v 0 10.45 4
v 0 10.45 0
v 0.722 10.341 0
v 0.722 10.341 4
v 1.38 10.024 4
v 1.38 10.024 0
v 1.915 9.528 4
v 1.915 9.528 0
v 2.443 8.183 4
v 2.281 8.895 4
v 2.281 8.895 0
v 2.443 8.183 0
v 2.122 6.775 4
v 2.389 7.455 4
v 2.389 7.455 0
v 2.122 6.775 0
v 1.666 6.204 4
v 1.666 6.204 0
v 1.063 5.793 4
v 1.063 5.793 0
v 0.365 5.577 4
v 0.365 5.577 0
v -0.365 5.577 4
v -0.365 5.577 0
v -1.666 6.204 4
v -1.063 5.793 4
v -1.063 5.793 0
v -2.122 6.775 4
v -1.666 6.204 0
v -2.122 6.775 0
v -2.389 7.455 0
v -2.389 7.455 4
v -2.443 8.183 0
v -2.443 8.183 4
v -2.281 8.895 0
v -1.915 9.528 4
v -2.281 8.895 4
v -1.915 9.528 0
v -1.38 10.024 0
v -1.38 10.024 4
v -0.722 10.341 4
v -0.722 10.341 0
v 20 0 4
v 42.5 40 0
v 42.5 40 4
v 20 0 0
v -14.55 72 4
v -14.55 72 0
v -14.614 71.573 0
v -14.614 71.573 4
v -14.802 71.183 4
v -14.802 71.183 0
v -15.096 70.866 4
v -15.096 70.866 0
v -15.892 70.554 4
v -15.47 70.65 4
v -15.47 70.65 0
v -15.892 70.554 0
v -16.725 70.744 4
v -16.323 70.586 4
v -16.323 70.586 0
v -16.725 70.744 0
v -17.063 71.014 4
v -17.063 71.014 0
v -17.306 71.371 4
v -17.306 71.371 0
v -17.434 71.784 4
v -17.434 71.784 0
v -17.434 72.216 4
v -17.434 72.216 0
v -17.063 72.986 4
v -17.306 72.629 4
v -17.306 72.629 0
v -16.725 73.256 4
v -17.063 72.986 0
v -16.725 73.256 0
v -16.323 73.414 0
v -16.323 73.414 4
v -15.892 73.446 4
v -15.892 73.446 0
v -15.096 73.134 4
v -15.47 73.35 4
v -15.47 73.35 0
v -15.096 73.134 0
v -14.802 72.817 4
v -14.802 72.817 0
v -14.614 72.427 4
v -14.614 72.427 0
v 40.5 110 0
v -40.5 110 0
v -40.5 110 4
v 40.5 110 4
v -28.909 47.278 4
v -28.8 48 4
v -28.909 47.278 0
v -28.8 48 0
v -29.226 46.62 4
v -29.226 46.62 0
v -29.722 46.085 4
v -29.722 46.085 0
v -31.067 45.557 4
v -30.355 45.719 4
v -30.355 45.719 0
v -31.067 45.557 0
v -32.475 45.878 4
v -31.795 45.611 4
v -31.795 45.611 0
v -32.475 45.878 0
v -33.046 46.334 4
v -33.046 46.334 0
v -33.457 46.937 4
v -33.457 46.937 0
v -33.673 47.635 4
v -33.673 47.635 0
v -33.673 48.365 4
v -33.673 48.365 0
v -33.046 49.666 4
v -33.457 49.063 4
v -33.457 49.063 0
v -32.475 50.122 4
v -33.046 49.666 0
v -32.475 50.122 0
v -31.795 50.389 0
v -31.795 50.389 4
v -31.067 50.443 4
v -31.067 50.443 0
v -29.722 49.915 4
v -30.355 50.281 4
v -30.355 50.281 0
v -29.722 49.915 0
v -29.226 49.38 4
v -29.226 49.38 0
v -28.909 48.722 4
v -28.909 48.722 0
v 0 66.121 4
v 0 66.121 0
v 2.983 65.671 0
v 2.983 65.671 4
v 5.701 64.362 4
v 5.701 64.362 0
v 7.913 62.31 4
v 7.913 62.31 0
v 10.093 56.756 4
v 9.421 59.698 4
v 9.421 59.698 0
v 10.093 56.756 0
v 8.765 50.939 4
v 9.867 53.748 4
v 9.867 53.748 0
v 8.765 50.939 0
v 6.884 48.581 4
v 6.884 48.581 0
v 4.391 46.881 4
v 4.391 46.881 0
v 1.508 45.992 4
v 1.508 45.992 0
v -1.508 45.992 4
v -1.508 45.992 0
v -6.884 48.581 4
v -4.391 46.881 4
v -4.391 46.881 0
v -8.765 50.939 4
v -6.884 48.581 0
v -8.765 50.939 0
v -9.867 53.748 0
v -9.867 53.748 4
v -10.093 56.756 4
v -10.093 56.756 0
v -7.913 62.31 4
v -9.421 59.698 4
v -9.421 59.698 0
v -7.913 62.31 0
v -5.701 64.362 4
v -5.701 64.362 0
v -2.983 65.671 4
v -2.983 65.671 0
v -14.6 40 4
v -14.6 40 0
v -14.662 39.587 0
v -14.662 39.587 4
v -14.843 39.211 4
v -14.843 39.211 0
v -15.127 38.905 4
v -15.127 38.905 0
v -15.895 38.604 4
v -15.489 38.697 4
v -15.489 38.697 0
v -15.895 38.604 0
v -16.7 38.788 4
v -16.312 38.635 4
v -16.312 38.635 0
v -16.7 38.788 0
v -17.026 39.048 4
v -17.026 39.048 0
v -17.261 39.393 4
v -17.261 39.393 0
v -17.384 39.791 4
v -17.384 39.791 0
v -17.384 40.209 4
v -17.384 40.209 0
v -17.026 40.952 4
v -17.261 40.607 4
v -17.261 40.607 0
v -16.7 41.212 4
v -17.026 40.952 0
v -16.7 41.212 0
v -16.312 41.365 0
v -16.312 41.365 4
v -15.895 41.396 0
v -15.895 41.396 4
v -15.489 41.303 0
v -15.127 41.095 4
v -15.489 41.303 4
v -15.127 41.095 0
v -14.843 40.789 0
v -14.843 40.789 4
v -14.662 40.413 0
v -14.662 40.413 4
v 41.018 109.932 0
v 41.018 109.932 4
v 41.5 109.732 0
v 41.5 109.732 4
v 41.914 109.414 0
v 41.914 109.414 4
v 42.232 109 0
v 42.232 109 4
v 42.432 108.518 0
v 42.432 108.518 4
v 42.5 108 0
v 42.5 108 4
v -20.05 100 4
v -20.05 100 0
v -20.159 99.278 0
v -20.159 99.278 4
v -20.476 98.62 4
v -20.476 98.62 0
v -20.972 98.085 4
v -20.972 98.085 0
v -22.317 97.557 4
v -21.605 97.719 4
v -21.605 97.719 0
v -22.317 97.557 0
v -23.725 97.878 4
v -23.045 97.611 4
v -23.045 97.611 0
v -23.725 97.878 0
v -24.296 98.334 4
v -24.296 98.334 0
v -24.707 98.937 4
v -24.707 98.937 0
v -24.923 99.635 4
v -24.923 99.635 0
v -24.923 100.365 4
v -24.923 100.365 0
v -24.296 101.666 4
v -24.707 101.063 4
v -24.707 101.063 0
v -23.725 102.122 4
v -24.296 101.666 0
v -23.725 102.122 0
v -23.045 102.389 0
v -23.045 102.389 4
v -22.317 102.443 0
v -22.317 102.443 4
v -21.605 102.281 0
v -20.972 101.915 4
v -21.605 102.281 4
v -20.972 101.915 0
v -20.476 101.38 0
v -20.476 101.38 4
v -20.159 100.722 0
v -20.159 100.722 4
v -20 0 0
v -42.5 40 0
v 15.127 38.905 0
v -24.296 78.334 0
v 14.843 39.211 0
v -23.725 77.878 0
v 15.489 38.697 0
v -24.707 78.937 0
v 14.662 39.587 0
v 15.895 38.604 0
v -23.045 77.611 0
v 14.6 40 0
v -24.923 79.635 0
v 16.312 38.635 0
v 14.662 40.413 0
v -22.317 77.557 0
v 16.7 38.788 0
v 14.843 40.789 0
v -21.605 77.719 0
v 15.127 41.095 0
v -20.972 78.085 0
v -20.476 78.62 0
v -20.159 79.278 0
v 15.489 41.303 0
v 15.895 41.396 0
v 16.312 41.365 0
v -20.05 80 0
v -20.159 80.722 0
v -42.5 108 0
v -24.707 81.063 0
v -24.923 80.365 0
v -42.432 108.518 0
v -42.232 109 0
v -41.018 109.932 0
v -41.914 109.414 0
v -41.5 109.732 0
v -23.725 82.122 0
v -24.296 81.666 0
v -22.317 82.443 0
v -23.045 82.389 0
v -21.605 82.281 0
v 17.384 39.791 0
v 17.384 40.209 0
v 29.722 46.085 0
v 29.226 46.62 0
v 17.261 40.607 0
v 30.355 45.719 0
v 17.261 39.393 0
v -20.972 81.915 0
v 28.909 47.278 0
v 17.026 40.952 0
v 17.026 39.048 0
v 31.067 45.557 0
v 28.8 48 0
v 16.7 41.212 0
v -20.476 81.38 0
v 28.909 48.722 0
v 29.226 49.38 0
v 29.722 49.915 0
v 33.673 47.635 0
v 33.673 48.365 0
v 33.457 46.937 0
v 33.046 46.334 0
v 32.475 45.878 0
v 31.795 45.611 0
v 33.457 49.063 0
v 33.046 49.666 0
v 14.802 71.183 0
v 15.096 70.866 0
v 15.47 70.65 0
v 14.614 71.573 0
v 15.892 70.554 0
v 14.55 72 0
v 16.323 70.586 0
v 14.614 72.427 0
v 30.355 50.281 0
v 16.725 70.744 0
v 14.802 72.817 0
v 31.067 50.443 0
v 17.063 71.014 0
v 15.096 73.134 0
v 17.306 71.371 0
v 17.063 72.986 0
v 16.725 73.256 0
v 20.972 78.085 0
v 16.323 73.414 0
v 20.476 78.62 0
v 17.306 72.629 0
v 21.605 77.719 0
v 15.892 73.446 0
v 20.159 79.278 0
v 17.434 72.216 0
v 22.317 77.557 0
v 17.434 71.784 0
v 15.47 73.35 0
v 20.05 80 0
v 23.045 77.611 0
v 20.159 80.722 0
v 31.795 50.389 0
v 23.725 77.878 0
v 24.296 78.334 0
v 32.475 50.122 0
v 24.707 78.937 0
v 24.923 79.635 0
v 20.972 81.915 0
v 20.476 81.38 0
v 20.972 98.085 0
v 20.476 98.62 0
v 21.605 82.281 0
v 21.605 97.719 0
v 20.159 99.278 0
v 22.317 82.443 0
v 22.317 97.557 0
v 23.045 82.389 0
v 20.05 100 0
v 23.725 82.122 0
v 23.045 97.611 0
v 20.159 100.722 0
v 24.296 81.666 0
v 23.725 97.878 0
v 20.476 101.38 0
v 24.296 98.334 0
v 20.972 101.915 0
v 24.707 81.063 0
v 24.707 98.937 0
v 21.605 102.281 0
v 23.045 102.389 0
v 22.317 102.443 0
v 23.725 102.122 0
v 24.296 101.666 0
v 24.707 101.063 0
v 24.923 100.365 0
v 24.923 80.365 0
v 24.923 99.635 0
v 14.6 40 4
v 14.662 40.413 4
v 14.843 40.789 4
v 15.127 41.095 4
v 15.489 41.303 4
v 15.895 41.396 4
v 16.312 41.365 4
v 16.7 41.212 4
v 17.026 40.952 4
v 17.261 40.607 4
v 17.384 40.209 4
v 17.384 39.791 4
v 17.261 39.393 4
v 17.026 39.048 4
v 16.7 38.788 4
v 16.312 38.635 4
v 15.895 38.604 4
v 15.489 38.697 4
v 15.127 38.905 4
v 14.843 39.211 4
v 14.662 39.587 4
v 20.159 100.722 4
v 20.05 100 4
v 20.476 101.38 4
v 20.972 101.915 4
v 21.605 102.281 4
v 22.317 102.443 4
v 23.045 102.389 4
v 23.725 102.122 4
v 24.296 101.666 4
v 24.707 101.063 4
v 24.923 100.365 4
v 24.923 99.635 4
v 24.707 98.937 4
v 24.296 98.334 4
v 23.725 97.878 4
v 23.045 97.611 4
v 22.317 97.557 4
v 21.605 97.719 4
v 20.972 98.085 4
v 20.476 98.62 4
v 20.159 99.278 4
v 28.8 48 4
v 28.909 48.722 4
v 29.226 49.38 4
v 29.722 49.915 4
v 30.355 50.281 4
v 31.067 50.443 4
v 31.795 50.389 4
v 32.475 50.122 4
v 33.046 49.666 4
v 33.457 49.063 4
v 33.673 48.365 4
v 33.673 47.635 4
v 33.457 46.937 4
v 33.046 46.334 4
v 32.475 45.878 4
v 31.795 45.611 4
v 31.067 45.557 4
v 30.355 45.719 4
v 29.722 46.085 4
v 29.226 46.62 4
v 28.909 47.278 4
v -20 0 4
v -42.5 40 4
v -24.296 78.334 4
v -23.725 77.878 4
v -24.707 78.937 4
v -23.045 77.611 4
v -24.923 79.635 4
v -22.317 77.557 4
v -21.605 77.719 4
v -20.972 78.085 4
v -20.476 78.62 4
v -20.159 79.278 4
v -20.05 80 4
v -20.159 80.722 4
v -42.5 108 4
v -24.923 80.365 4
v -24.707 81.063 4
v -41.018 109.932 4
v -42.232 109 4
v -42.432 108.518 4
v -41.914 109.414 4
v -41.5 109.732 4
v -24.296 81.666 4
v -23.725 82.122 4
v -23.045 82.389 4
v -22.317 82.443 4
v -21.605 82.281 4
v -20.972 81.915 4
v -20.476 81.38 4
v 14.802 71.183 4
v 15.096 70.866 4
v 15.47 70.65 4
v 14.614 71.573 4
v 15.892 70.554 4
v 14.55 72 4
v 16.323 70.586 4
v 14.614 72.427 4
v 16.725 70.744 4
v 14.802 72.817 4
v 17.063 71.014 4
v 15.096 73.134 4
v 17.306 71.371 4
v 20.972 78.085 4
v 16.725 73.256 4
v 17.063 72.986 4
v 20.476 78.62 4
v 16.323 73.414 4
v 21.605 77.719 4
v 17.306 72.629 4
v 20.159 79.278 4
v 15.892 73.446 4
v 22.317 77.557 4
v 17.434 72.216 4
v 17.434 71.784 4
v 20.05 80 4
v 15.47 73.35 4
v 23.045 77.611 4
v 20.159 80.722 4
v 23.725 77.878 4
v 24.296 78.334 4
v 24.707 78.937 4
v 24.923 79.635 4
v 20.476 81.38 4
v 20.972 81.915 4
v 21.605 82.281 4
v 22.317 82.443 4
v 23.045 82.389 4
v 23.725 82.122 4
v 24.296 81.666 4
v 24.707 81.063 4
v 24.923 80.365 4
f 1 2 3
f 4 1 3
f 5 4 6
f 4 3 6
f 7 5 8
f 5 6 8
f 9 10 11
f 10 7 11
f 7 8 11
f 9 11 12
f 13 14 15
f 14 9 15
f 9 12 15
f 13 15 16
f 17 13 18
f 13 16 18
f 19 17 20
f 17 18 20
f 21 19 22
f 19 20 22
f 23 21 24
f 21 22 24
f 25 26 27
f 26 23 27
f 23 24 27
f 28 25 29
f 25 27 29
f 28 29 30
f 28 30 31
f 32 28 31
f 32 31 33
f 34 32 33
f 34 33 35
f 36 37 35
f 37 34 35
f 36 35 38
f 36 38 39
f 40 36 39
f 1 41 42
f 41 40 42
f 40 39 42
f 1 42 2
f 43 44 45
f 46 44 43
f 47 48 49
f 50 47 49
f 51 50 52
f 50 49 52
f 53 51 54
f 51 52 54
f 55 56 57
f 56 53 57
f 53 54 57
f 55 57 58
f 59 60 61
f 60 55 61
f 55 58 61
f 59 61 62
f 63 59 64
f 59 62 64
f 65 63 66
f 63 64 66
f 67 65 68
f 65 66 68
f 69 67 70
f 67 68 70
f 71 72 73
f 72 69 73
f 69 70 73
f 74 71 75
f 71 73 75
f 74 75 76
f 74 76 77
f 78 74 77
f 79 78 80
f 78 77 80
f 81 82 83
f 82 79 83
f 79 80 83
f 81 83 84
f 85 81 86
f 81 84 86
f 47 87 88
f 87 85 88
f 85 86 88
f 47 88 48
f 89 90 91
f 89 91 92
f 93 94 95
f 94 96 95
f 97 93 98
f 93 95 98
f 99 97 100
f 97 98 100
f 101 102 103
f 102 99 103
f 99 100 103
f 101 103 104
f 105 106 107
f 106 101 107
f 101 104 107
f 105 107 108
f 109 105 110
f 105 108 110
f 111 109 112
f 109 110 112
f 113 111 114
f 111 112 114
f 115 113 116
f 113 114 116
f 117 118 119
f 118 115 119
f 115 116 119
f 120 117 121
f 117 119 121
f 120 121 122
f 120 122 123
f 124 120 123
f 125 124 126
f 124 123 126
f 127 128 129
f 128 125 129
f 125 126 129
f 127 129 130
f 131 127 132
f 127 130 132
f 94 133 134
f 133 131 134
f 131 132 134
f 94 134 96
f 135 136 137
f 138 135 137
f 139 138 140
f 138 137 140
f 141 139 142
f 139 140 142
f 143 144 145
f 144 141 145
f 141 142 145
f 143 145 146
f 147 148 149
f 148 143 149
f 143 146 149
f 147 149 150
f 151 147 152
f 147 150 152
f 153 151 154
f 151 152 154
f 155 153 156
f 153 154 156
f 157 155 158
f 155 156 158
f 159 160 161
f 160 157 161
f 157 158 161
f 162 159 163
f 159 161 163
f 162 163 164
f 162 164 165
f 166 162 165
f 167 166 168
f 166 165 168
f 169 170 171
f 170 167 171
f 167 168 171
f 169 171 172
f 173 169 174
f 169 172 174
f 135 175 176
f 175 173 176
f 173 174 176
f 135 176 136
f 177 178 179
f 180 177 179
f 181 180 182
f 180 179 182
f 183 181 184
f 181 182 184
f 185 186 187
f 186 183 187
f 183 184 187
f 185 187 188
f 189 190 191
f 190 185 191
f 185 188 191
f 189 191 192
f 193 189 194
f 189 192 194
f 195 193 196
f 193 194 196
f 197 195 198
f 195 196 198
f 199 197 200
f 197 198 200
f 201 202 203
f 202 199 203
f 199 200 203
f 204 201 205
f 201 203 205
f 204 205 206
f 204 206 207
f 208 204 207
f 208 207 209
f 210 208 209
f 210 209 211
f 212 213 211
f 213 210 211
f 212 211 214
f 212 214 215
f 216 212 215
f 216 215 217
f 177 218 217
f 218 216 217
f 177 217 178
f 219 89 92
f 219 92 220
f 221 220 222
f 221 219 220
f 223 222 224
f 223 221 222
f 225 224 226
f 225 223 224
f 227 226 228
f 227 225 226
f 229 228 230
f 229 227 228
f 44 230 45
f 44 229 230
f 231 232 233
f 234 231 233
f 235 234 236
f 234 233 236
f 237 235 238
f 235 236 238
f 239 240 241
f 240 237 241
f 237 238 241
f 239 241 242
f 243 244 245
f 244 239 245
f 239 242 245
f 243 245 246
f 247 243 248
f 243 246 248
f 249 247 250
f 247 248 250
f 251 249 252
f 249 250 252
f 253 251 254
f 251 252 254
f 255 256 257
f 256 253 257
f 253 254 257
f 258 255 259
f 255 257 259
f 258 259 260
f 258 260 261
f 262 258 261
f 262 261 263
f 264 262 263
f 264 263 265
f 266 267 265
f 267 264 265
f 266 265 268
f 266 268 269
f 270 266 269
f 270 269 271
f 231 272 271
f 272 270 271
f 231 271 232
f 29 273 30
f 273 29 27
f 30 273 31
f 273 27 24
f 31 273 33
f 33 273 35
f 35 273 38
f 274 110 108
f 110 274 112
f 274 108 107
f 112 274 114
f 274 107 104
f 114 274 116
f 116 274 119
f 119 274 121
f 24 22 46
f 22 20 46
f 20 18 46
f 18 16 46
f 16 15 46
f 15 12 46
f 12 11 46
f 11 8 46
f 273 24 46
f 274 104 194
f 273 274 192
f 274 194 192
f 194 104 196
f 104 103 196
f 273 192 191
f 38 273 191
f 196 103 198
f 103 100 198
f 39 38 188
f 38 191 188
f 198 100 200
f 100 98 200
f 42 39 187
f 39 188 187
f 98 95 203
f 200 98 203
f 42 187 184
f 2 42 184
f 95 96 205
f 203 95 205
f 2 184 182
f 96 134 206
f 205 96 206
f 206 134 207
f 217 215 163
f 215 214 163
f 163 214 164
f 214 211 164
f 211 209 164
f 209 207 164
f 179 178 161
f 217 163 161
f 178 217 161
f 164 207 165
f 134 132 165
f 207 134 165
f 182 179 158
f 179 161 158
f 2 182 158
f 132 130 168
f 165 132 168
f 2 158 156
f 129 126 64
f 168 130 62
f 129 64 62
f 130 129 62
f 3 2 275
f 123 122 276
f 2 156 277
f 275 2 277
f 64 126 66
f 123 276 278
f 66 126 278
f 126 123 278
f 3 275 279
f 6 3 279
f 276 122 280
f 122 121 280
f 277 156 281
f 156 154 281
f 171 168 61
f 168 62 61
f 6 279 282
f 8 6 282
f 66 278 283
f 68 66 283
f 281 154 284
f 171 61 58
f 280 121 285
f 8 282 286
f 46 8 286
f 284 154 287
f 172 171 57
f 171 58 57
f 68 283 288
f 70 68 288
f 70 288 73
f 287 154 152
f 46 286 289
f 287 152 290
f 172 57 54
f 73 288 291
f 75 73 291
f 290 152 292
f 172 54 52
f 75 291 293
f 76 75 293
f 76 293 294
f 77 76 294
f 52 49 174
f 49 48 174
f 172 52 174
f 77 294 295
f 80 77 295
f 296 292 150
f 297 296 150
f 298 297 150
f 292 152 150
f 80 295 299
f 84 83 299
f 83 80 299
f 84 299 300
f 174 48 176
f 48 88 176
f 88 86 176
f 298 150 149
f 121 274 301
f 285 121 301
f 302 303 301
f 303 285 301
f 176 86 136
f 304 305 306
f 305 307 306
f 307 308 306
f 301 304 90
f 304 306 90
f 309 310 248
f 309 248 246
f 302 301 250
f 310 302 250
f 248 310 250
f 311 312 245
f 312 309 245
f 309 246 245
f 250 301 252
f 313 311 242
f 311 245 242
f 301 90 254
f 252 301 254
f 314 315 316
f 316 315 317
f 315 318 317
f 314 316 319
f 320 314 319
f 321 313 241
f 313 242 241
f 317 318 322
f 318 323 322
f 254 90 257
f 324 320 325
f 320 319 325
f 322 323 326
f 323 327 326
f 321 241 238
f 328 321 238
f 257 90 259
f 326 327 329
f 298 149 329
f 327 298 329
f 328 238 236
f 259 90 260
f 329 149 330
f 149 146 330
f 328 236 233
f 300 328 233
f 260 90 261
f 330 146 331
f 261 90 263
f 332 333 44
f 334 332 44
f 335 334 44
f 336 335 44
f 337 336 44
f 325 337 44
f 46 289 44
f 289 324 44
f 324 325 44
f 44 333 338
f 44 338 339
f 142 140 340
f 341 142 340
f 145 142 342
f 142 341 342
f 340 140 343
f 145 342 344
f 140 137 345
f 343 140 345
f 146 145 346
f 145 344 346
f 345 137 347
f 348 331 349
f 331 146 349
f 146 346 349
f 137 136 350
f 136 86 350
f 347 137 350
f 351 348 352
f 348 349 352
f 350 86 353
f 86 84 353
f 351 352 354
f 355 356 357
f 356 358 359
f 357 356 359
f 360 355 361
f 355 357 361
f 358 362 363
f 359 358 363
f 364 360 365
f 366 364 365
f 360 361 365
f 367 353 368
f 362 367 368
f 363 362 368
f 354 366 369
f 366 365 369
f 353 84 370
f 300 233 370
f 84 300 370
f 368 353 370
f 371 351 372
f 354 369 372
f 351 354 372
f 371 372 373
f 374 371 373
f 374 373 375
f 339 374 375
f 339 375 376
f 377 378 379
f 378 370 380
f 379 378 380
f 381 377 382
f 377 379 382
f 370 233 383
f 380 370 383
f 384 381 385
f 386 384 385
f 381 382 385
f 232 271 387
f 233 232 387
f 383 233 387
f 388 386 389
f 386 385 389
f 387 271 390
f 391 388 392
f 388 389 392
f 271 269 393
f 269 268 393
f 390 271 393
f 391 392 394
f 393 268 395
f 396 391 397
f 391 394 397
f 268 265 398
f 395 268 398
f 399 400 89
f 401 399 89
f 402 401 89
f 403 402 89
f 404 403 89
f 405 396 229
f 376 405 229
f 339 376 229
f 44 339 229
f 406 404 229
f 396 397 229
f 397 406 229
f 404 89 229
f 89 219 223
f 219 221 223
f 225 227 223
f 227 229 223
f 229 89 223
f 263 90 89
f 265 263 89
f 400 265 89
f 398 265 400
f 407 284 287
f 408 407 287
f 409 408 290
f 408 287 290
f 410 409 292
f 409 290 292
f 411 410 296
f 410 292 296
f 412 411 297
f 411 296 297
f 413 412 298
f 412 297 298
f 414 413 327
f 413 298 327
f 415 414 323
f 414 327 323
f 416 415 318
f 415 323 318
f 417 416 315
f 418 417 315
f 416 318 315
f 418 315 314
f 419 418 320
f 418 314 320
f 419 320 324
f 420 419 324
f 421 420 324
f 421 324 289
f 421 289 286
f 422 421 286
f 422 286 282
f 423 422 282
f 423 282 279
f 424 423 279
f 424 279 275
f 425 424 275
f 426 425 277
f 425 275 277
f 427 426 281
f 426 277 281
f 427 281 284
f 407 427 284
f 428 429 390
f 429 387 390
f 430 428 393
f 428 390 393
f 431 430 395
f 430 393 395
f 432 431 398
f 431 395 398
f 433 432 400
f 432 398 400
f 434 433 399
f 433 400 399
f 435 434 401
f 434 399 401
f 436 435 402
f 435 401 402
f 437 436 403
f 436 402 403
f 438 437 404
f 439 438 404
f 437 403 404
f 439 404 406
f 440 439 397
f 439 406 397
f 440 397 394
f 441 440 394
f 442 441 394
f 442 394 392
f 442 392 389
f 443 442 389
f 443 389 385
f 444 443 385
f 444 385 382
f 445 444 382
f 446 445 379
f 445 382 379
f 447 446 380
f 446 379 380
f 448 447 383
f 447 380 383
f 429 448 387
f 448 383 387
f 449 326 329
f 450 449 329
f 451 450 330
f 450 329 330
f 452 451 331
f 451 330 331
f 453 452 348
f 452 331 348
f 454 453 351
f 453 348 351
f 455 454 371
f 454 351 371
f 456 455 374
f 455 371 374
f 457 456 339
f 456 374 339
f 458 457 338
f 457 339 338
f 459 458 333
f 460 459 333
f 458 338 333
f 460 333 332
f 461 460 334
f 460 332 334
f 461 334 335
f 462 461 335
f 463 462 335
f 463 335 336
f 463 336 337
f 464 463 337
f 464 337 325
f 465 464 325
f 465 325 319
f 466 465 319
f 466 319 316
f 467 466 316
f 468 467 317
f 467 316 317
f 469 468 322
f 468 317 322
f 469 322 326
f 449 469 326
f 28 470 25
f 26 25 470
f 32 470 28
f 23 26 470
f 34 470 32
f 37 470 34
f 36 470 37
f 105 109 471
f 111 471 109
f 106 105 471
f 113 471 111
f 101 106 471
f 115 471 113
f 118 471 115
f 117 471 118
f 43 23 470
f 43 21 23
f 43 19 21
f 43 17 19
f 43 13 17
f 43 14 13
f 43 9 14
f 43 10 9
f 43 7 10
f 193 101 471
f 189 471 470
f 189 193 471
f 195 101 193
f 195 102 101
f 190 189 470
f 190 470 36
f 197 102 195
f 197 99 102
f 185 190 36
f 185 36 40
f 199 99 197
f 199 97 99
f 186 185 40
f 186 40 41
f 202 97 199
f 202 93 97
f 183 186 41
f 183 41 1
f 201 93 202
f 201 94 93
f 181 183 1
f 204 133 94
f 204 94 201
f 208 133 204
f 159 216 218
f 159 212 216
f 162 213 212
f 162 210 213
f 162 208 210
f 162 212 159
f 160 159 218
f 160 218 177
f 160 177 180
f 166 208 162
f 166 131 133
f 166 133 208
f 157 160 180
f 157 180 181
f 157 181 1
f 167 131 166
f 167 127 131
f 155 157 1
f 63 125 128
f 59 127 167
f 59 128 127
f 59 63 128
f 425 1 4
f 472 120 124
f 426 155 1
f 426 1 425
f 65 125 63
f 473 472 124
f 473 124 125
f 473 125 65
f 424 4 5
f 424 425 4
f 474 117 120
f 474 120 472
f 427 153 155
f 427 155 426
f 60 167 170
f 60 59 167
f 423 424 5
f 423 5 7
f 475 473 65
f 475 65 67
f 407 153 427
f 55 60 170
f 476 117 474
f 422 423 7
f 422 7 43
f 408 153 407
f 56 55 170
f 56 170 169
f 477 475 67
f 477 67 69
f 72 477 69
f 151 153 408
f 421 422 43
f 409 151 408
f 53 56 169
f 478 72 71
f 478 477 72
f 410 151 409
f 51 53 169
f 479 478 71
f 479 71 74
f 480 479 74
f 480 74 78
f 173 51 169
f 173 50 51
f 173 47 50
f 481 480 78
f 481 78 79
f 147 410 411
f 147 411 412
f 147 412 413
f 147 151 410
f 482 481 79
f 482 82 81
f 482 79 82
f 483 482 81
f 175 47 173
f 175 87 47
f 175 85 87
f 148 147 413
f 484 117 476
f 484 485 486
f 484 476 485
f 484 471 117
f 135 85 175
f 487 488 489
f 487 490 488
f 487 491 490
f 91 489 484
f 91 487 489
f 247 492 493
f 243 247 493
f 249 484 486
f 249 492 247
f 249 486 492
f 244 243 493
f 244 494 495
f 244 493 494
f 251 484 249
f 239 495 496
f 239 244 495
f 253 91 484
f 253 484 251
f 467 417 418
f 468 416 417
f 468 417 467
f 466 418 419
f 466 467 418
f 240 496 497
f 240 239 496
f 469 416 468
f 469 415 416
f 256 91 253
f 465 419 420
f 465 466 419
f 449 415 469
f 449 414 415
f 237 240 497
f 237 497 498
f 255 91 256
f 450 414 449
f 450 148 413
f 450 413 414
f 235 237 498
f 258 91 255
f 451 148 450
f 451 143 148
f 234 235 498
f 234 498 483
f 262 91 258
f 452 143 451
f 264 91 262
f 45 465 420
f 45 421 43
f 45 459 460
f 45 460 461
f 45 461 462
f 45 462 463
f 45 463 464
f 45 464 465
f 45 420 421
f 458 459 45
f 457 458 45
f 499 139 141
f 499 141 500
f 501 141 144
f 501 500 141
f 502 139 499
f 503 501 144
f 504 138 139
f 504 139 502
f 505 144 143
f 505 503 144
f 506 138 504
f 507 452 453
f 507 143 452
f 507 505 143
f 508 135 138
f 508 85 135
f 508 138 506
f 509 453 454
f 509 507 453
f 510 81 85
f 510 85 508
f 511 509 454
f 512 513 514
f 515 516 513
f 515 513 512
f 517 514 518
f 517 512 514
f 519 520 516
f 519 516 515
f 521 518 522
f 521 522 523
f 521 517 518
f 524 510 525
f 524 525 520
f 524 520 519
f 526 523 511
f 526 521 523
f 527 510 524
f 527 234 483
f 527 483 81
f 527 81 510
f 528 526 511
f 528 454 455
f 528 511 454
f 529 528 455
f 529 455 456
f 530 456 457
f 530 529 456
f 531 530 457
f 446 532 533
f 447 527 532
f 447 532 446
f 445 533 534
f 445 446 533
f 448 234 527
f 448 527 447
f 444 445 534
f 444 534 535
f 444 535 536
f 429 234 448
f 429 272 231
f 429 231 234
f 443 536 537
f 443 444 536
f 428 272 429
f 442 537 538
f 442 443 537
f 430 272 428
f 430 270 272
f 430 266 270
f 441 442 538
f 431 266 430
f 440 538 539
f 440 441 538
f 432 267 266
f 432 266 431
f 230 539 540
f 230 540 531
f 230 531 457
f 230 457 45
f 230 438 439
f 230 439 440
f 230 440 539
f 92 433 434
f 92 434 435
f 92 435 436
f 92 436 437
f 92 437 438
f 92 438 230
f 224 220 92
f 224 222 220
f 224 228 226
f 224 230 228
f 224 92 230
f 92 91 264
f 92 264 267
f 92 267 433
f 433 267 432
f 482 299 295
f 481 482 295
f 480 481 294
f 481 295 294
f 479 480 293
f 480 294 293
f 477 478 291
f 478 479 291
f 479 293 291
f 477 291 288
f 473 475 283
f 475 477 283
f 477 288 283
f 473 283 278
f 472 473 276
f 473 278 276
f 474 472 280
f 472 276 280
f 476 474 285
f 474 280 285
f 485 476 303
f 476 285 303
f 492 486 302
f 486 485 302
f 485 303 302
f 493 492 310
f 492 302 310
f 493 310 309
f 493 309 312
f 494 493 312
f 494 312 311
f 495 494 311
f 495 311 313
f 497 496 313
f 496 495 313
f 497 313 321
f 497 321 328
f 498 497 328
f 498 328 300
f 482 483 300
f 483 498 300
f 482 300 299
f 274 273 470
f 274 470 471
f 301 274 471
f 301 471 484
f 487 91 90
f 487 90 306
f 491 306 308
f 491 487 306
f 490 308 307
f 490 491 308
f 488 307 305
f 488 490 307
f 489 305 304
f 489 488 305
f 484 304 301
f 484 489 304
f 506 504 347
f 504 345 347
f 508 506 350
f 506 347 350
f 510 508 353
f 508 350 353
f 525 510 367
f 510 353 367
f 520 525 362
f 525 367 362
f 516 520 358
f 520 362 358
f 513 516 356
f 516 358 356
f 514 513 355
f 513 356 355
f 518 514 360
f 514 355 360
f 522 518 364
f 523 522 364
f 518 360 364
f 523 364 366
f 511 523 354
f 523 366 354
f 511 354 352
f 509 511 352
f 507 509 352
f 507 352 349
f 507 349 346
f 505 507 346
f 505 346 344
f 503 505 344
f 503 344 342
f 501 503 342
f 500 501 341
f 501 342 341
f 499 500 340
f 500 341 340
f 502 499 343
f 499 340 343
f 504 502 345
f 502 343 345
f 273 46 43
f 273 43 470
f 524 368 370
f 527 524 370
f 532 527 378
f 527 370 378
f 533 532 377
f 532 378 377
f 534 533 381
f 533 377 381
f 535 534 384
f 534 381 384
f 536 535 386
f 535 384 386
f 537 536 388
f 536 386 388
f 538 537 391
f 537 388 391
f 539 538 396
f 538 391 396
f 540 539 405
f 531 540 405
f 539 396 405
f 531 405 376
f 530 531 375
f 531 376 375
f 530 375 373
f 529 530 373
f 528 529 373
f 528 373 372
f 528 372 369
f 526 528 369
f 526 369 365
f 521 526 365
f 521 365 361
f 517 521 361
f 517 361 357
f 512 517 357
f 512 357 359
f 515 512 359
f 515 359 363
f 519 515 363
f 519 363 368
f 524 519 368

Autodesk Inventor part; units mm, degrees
ref_plane "YZ Plane" through (0, 0, 0) normal (1, 0, 0) x (0, 1, 0)
ref_plane "XZ Plane" through (0, 0, 0) normal (0, 1, 0) x (-1, 0, 0)
ref_plane "XY Plane" through (0, 0, 0) normal (0, 0, 1) x (1, 0, 0)
sketch "Sketch1" plane through (0, 0, 0) normal (0, 0, 1) x (1, 0, 0)
  line L0 (0, 0) -> (-20, 0)
  line L1 (-20, 0) -> (-42.5, 40)
  line L2 (-42.5, 40) -> (-42.5, 110)
  line L3 (-42.5, 110) -> (0, 110)
  circle A0 centre (0, 8) radius 2.45
  circle A1 centre (-31.25, 48) radius 2.45
  circle A2 centre (0, 56) radius 10.1211
  line L4 (16, 72) -> (-16, 72) construction
  line L5 (-16, 72) -> (-16, 40) construction
  line L6 (-16, 40) -> (16, 40) construction
  line L7 (16, 40) -> (16, 72) construction
  line L8 (16, 72) -> (-16, 40) construction
  line L9 (-16, 72) -> (16, 40) construction
  circle A3 centre (-16, 72) radius 1.45
  circle A4 centre (-16, 40) radius 1.4
  circle A5 centre (-22.5, 100) radius 2.45
  circle A6 centre (-22.5, 80) radius 2.45
  line L10 (0, 110) -> (0, 66.1211)
  line L11 (0, 45.8789) -> (0, 10.45)
  line L12 (0, 5.55) -> (0, 0)
  dimension "d0" = 20
  dimension "d2" = 40
  dimension "d3" = 70
  dimension "d4" = 4.9
  dimension "d5" = 4.9
  dimension "d6" = 32
  dimension "d7" = 32
  dimension "d8" = 8
  dimension "d9" = 40
  dimension "d10" = 8
  dimension "d11" = 2.9
  dimension "d12" = 2.8
  dimension "d13" = 4.9
  dimension "d14" = 4.9
  dimension "d15" = 10
  dimension "d16" = 30
  dimension "d17" = 20
  dimension "d18" = 20
extrude "Extrusion1" add sketch "Sketch1" along normal blind 4 contours L0 L1 L2 L3 L10 A2 L11 A0 L12
fillet "Fillet1" radius 2 1 edges at (-42.5, 110, 2)
mirror "Mirror1" about plane through (0, 66.1211, 0) normal (1, 0, 0) of "Extrusion1", "Fillet1"
ref_plane "Work Plane1" through (-20, 28, 0) normal (0, -1, 0) x (1, 0, 0)
equation "\"d17\" = d18"
properties part number "TOTEM_Base_Slide_x_20mmrod"
